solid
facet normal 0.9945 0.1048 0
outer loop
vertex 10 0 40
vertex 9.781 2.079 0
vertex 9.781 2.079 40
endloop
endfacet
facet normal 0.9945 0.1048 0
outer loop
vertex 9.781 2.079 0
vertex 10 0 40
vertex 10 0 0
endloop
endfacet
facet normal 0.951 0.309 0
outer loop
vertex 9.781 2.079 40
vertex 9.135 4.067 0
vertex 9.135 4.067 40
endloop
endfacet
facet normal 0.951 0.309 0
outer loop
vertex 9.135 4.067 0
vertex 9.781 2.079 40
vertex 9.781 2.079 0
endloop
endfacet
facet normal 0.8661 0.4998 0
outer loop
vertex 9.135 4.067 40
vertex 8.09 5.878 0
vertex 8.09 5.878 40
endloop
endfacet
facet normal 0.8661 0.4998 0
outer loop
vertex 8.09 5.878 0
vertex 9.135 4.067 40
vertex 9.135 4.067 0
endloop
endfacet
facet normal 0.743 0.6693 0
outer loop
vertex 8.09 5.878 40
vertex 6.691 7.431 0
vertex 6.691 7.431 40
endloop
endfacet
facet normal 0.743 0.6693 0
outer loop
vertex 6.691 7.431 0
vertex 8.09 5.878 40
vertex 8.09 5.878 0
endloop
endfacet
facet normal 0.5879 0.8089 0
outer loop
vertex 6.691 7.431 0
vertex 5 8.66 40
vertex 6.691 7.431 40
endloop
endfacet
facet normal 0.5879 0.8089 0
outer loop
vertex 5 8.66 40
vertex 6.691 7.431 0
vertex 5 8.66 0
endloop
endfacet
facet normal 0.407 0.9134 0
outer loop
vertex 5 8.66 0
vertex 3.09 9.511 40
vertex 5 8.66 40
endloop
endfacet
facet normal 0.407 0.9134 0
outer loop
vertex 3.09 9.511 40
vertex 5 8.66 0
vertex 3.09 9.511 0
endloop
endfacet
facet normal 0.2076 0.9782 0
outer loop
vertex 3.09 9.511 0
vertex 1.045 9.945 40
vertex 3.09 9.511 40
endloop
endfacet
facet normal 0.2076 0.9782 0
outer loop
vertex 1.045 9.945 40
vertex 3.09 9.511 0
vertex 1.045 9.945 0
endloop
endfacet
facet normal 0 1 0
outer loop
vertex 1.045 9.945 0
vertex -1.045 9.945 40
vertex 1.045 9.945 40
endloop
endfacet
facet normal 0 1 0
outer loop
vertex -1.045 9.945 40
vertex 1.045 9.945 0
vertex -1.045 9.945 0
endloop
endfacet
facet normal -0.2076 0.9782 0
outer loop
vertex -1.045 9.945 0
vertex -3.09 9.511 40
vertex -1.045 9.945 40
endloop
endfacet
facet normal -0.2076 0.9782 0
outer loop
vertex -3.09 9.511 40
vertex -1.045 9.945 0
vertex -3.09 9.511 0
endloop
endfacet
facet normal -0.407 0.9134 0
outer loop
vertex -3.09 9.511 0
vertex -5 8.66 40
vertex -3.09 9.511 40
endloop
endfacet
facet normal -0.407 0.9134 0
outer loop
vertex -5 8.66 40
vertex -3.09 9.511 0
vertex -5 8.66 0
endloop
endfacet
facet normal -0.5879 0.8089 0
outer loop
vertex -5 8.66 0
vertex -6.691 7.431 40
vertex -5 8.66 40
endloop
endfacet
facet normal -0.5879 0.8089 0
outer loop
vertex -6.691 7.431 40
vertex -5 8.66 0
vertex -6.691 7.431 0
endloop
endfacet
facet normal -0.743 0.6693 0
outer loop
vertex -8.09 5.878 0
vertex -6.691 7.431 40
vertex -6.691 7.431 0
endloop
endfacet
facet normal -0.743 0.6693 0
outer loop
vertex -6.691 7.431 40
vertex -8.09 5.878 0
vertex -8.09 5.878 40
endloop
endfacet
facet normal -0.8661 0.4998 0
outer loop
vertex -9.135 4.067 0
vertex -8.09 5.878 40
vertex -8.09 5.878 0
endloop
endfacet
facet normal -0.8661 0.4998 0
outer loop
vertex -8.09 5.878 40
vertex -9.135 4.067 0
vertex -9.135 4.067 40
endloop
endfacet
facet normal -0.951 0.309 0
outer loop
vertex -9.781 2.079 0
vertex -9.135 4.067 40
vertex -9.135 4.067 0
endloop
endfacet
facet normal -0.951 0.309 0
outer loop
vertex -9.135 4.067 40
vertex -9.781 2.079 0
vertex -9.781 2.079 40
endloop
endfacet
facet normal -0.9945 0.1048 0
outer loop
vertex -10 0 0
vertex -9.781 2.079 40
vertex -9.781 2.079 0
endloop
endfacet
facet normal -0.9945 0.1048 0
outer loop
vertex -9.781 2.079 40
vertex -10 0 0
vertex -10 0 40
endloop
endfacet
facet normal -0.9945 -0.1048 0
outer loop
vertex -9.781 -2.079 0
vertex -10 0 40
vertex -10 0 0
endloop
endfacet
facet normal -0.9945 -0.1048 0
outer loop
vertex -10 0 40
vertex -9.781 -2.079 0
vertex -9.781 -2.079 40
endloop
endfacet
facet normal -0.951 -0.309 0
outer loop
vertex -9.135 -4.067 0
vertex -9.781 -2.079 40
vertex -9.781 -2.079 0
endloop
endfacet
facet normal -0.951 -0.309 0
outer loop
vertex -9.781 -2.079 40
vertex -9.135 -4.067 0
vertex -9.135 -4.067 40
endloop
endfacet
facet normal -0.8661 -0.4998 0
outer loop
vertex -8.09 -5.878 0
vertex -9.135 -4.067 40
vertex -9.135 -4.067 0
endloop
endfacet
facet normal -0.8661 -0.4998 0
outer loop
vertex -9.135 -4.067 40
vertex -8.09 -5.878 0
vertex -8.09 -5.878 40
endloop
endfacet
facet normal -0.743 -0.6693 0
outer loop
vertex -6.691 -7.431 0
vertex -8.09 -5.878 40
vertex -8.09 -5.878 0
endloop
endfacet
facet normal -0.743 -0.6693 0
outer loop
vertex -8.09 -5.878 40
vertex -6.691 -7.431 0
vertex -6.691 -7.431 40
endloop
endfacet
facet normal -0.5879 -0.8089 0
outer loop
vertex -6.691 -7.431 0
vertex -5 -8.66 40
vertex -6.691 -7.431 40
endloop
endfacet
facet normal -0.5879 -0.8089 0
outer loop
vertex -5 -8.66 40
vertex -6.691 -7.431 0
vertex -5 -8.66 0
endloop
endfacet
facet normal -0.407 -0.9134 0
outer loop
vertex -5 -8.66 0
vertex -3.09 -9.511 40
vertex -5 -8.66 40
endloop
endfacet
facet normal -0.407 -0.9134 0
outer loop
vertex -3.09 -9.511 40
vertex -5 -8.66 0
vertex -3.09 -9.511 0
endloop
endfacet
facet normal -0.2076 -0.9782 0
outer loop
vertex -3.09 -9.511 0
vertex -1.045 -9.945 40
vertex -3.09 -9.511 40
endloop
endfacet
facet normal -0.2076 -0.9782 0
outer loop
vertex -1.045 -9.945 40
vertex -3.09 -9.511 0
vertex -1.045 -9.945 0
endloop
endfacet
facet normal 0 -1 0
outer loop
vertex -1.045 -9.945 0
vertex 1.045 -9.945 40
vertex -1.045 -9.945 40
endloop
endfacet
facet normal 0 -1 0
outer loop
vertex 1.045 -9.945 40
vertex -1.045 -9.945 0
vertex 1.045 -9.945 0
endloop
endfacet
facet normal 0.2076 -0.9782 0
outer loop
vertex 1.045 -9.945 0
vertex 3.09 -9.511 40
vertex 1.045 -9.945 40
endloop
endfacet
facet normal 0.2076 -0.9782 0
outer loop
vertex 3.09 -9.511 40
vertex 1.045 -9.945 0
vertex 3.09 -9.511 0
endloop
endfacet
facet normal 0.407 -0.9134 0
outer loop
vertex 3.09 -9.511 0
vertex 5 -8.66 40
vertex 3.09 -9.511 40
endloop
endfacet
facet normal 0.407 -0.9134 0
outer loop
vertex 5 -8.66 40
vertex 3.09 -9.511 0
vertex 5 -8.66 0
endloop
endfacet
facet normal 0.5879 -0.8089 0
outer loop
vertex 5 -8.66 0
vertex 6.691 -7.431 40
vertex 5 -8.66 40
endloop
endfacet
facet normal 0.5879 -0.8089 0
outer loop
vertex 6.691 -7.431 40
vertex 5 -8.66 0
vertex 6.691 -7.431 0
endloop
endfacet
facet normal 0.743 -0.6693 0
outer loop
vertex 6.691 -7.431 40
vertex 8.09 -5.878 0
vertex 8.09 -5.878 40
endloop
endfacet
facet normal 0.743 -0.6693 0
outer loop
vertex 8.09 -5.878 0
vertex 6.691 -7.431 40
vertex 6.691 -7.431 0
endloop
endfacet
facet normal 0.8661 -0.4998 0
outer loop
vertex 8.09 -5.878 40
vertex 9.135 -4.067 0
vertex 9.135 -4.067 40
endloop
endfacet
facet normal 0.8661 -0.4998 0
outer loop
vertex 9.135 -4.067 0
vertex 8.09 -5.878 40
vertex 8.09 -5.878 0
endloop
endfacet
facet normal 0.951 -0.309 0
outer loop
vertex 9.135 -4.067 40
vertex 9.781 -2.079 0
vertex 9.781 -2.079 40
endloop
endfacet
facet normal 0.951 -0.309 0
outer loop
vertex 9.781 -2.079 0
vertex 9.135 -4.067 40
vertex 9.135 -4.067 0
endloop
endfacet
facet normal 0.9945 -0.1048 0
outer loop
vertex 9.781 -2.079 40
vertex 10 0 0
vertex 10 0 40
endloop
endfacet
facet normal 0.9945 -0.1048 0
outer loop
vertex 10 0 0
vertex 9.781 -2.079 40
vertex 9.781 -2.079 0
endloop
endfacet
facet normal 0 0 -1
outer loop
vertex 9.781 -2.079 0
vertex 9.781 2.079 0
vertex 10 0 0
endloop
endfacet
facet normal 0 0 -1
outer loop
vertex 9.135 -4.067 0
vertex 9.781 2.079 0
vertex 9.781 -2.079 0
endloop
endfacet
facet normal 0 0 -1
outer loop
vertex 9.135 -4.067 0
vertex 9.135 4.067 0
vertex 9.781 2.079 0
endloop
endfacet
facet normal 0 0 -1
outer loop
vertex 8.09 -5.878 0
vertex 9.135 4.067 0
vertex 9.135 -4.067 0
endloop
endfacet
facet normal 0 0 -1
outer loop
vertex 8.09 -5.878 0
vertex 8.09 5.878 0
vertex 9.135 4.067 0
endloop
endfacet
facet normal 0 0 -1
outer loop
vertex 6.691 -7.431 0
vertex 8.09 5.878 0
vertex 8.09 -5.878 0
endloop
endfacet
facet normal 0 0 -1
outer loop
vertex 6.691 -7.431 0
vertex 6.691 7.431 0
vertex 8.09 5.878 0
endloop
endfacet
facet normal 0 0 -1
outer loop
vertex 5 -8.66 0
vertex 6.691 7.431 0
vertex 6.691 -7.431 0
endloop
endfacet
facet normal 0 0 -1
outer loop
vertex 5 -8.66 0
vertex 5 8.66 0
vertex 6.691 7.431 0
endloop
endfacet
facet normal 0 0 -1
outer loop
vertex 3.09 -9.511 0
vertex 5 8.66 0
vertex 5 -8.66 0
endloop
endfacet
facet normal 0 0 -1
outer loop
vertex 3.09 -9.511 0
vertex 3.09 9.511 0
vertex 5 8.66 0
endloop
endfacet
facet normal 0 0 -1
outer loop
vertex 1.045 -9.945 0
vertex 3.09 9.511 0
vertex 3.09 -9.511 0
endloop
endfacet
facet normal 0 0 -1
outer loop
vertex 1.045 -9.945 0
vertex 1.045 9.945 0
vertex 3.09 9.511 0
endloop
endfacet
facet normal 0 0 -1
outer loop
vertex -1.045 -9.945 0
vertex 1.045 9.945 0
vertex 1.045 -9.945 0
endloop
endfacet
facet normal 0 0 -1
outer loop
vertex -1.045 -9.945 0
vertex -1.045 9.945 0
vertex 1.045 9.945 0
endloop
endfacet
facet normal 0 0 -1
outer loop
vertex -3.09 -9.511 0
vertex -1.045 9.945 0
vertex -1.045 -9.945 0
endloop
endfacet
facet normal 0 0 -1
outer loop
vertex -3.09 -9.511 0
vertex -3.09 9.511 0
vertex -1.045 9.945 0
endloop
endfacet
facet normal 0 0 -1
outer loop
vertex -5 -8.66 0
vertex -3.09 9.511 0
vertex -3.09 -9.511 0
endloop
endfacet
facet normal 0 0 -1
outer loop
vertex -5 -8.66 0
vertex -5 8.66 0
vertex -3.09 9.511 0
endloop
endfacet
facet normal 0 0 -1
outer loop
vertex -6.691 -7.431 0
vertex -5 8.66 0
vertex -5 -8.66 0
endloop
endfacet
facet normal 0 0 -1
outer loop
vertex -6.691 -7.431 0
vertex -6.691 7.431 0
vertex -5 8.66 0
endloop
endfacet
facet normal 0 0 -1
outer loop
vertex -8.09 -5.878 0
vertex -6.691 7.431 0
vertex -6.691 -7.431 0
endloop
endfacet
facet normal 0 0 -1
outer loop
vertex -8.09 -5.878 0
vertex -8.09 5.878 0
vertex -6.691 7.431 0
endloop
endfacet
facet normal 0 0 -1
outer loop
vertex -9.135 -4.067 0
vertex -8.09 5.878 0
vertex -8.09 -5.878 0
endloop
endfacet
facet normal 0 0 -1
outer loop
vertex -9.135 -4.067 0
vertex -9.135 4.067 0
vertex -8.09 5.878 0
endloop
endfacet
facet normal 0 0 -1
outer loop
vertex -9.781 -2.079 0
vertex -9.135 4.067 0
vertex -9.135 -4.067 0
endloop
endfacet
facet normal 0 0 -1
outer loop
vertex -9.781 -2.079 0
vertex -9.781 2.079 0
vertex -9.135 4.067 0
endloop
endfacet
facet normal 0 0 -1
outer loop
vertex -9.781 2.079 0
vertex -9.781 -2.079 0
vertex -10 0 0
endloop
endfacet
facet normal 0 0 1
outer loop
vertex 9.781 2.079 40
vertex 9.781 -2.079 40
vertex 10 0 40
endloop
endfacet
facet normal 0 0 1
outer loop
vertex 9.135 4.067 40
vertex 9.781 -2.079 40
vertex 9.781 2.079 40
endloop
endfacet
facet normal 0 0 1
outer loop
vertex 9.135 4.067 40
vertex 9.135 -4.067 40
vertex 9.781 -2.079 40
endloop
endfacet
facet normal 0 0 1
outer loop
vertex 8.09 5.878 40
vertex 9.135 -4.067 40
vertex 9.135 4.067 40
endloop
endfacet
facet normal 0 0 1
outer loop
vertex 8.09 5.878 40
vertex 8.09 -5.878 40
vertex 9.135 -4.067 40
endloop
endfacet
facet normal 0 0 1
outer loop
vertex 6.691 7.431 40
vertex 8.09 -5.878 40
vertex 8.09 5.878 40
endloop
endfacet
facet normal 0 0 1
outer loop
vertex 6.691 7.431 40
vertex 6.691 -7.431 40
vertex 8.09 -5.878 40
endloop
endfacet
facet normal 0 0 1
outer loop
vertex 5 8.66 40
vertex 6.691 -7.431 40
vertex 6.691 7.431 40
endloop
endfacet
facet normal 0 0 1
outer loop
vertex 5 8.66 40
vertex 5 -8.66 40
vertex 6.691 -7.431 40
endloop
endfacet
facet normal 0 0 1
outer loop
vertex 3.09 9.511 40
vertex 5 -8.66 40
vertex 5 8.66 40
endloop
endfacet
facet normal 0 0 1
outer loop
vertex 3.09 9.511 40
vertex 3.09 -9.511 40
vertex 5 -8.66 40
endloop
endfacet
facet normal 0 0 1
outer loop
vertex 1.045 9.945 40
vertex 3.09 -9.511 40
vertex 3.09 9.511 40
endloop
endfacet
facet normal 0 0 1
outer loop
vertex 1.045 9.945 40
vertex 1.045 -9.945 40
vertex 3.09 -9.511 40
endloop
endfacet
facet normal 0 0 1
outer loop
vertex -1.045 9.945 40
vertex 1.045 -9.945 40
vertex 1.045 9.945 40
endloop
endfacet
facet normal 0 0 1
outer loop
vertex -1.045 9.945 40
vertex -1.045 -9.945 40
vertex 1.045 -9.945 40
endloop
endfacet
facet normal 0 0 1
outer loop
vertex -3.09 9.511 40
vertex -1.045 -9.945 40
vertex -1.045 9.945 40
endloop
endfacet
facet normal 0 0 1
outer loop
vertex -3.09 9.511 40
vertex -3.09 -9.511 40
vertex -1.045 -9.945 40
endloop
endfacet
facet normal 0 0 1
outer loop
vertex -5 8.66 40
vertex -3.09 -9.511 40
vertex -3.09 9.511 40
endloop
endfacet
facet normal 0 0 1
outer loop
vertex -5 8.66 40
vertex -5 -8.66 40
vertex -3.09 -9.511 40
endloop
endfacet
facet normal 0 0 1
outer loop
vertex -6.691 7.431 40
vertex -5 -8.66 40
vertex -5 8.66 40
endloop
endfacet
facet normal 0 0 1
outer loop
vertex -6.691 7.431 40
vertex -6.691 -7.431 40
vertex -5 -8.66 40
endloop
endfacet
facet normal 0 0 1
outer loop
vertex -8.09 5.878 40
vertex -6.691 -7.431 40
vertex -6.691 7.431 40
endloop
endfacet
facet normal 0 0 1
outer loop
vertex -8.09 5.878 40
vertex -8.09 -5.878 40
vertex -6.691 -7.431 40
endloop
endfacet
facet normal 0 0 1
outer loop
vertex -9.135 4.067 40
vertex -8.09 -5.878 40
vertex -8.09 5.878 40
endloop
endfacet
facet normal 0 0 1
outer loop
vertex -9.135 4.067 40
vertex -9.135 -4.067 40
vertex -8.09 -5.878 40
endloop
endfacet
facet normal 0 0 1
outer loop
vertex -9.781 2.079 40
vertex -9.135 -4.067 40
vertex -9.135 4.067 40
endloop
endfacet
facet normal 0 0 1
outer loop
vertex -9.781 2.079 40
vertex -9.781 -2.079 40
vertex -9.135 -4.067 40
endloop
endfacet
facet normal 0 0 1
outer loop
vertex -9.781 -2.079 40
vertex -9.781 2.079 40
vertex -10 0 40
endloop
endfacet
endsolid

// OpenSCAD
module rounding_cylinder_centered() {
    cylinder(h=40, r=10);
}

// call module when run directly
rounding_cylinder_centered();
